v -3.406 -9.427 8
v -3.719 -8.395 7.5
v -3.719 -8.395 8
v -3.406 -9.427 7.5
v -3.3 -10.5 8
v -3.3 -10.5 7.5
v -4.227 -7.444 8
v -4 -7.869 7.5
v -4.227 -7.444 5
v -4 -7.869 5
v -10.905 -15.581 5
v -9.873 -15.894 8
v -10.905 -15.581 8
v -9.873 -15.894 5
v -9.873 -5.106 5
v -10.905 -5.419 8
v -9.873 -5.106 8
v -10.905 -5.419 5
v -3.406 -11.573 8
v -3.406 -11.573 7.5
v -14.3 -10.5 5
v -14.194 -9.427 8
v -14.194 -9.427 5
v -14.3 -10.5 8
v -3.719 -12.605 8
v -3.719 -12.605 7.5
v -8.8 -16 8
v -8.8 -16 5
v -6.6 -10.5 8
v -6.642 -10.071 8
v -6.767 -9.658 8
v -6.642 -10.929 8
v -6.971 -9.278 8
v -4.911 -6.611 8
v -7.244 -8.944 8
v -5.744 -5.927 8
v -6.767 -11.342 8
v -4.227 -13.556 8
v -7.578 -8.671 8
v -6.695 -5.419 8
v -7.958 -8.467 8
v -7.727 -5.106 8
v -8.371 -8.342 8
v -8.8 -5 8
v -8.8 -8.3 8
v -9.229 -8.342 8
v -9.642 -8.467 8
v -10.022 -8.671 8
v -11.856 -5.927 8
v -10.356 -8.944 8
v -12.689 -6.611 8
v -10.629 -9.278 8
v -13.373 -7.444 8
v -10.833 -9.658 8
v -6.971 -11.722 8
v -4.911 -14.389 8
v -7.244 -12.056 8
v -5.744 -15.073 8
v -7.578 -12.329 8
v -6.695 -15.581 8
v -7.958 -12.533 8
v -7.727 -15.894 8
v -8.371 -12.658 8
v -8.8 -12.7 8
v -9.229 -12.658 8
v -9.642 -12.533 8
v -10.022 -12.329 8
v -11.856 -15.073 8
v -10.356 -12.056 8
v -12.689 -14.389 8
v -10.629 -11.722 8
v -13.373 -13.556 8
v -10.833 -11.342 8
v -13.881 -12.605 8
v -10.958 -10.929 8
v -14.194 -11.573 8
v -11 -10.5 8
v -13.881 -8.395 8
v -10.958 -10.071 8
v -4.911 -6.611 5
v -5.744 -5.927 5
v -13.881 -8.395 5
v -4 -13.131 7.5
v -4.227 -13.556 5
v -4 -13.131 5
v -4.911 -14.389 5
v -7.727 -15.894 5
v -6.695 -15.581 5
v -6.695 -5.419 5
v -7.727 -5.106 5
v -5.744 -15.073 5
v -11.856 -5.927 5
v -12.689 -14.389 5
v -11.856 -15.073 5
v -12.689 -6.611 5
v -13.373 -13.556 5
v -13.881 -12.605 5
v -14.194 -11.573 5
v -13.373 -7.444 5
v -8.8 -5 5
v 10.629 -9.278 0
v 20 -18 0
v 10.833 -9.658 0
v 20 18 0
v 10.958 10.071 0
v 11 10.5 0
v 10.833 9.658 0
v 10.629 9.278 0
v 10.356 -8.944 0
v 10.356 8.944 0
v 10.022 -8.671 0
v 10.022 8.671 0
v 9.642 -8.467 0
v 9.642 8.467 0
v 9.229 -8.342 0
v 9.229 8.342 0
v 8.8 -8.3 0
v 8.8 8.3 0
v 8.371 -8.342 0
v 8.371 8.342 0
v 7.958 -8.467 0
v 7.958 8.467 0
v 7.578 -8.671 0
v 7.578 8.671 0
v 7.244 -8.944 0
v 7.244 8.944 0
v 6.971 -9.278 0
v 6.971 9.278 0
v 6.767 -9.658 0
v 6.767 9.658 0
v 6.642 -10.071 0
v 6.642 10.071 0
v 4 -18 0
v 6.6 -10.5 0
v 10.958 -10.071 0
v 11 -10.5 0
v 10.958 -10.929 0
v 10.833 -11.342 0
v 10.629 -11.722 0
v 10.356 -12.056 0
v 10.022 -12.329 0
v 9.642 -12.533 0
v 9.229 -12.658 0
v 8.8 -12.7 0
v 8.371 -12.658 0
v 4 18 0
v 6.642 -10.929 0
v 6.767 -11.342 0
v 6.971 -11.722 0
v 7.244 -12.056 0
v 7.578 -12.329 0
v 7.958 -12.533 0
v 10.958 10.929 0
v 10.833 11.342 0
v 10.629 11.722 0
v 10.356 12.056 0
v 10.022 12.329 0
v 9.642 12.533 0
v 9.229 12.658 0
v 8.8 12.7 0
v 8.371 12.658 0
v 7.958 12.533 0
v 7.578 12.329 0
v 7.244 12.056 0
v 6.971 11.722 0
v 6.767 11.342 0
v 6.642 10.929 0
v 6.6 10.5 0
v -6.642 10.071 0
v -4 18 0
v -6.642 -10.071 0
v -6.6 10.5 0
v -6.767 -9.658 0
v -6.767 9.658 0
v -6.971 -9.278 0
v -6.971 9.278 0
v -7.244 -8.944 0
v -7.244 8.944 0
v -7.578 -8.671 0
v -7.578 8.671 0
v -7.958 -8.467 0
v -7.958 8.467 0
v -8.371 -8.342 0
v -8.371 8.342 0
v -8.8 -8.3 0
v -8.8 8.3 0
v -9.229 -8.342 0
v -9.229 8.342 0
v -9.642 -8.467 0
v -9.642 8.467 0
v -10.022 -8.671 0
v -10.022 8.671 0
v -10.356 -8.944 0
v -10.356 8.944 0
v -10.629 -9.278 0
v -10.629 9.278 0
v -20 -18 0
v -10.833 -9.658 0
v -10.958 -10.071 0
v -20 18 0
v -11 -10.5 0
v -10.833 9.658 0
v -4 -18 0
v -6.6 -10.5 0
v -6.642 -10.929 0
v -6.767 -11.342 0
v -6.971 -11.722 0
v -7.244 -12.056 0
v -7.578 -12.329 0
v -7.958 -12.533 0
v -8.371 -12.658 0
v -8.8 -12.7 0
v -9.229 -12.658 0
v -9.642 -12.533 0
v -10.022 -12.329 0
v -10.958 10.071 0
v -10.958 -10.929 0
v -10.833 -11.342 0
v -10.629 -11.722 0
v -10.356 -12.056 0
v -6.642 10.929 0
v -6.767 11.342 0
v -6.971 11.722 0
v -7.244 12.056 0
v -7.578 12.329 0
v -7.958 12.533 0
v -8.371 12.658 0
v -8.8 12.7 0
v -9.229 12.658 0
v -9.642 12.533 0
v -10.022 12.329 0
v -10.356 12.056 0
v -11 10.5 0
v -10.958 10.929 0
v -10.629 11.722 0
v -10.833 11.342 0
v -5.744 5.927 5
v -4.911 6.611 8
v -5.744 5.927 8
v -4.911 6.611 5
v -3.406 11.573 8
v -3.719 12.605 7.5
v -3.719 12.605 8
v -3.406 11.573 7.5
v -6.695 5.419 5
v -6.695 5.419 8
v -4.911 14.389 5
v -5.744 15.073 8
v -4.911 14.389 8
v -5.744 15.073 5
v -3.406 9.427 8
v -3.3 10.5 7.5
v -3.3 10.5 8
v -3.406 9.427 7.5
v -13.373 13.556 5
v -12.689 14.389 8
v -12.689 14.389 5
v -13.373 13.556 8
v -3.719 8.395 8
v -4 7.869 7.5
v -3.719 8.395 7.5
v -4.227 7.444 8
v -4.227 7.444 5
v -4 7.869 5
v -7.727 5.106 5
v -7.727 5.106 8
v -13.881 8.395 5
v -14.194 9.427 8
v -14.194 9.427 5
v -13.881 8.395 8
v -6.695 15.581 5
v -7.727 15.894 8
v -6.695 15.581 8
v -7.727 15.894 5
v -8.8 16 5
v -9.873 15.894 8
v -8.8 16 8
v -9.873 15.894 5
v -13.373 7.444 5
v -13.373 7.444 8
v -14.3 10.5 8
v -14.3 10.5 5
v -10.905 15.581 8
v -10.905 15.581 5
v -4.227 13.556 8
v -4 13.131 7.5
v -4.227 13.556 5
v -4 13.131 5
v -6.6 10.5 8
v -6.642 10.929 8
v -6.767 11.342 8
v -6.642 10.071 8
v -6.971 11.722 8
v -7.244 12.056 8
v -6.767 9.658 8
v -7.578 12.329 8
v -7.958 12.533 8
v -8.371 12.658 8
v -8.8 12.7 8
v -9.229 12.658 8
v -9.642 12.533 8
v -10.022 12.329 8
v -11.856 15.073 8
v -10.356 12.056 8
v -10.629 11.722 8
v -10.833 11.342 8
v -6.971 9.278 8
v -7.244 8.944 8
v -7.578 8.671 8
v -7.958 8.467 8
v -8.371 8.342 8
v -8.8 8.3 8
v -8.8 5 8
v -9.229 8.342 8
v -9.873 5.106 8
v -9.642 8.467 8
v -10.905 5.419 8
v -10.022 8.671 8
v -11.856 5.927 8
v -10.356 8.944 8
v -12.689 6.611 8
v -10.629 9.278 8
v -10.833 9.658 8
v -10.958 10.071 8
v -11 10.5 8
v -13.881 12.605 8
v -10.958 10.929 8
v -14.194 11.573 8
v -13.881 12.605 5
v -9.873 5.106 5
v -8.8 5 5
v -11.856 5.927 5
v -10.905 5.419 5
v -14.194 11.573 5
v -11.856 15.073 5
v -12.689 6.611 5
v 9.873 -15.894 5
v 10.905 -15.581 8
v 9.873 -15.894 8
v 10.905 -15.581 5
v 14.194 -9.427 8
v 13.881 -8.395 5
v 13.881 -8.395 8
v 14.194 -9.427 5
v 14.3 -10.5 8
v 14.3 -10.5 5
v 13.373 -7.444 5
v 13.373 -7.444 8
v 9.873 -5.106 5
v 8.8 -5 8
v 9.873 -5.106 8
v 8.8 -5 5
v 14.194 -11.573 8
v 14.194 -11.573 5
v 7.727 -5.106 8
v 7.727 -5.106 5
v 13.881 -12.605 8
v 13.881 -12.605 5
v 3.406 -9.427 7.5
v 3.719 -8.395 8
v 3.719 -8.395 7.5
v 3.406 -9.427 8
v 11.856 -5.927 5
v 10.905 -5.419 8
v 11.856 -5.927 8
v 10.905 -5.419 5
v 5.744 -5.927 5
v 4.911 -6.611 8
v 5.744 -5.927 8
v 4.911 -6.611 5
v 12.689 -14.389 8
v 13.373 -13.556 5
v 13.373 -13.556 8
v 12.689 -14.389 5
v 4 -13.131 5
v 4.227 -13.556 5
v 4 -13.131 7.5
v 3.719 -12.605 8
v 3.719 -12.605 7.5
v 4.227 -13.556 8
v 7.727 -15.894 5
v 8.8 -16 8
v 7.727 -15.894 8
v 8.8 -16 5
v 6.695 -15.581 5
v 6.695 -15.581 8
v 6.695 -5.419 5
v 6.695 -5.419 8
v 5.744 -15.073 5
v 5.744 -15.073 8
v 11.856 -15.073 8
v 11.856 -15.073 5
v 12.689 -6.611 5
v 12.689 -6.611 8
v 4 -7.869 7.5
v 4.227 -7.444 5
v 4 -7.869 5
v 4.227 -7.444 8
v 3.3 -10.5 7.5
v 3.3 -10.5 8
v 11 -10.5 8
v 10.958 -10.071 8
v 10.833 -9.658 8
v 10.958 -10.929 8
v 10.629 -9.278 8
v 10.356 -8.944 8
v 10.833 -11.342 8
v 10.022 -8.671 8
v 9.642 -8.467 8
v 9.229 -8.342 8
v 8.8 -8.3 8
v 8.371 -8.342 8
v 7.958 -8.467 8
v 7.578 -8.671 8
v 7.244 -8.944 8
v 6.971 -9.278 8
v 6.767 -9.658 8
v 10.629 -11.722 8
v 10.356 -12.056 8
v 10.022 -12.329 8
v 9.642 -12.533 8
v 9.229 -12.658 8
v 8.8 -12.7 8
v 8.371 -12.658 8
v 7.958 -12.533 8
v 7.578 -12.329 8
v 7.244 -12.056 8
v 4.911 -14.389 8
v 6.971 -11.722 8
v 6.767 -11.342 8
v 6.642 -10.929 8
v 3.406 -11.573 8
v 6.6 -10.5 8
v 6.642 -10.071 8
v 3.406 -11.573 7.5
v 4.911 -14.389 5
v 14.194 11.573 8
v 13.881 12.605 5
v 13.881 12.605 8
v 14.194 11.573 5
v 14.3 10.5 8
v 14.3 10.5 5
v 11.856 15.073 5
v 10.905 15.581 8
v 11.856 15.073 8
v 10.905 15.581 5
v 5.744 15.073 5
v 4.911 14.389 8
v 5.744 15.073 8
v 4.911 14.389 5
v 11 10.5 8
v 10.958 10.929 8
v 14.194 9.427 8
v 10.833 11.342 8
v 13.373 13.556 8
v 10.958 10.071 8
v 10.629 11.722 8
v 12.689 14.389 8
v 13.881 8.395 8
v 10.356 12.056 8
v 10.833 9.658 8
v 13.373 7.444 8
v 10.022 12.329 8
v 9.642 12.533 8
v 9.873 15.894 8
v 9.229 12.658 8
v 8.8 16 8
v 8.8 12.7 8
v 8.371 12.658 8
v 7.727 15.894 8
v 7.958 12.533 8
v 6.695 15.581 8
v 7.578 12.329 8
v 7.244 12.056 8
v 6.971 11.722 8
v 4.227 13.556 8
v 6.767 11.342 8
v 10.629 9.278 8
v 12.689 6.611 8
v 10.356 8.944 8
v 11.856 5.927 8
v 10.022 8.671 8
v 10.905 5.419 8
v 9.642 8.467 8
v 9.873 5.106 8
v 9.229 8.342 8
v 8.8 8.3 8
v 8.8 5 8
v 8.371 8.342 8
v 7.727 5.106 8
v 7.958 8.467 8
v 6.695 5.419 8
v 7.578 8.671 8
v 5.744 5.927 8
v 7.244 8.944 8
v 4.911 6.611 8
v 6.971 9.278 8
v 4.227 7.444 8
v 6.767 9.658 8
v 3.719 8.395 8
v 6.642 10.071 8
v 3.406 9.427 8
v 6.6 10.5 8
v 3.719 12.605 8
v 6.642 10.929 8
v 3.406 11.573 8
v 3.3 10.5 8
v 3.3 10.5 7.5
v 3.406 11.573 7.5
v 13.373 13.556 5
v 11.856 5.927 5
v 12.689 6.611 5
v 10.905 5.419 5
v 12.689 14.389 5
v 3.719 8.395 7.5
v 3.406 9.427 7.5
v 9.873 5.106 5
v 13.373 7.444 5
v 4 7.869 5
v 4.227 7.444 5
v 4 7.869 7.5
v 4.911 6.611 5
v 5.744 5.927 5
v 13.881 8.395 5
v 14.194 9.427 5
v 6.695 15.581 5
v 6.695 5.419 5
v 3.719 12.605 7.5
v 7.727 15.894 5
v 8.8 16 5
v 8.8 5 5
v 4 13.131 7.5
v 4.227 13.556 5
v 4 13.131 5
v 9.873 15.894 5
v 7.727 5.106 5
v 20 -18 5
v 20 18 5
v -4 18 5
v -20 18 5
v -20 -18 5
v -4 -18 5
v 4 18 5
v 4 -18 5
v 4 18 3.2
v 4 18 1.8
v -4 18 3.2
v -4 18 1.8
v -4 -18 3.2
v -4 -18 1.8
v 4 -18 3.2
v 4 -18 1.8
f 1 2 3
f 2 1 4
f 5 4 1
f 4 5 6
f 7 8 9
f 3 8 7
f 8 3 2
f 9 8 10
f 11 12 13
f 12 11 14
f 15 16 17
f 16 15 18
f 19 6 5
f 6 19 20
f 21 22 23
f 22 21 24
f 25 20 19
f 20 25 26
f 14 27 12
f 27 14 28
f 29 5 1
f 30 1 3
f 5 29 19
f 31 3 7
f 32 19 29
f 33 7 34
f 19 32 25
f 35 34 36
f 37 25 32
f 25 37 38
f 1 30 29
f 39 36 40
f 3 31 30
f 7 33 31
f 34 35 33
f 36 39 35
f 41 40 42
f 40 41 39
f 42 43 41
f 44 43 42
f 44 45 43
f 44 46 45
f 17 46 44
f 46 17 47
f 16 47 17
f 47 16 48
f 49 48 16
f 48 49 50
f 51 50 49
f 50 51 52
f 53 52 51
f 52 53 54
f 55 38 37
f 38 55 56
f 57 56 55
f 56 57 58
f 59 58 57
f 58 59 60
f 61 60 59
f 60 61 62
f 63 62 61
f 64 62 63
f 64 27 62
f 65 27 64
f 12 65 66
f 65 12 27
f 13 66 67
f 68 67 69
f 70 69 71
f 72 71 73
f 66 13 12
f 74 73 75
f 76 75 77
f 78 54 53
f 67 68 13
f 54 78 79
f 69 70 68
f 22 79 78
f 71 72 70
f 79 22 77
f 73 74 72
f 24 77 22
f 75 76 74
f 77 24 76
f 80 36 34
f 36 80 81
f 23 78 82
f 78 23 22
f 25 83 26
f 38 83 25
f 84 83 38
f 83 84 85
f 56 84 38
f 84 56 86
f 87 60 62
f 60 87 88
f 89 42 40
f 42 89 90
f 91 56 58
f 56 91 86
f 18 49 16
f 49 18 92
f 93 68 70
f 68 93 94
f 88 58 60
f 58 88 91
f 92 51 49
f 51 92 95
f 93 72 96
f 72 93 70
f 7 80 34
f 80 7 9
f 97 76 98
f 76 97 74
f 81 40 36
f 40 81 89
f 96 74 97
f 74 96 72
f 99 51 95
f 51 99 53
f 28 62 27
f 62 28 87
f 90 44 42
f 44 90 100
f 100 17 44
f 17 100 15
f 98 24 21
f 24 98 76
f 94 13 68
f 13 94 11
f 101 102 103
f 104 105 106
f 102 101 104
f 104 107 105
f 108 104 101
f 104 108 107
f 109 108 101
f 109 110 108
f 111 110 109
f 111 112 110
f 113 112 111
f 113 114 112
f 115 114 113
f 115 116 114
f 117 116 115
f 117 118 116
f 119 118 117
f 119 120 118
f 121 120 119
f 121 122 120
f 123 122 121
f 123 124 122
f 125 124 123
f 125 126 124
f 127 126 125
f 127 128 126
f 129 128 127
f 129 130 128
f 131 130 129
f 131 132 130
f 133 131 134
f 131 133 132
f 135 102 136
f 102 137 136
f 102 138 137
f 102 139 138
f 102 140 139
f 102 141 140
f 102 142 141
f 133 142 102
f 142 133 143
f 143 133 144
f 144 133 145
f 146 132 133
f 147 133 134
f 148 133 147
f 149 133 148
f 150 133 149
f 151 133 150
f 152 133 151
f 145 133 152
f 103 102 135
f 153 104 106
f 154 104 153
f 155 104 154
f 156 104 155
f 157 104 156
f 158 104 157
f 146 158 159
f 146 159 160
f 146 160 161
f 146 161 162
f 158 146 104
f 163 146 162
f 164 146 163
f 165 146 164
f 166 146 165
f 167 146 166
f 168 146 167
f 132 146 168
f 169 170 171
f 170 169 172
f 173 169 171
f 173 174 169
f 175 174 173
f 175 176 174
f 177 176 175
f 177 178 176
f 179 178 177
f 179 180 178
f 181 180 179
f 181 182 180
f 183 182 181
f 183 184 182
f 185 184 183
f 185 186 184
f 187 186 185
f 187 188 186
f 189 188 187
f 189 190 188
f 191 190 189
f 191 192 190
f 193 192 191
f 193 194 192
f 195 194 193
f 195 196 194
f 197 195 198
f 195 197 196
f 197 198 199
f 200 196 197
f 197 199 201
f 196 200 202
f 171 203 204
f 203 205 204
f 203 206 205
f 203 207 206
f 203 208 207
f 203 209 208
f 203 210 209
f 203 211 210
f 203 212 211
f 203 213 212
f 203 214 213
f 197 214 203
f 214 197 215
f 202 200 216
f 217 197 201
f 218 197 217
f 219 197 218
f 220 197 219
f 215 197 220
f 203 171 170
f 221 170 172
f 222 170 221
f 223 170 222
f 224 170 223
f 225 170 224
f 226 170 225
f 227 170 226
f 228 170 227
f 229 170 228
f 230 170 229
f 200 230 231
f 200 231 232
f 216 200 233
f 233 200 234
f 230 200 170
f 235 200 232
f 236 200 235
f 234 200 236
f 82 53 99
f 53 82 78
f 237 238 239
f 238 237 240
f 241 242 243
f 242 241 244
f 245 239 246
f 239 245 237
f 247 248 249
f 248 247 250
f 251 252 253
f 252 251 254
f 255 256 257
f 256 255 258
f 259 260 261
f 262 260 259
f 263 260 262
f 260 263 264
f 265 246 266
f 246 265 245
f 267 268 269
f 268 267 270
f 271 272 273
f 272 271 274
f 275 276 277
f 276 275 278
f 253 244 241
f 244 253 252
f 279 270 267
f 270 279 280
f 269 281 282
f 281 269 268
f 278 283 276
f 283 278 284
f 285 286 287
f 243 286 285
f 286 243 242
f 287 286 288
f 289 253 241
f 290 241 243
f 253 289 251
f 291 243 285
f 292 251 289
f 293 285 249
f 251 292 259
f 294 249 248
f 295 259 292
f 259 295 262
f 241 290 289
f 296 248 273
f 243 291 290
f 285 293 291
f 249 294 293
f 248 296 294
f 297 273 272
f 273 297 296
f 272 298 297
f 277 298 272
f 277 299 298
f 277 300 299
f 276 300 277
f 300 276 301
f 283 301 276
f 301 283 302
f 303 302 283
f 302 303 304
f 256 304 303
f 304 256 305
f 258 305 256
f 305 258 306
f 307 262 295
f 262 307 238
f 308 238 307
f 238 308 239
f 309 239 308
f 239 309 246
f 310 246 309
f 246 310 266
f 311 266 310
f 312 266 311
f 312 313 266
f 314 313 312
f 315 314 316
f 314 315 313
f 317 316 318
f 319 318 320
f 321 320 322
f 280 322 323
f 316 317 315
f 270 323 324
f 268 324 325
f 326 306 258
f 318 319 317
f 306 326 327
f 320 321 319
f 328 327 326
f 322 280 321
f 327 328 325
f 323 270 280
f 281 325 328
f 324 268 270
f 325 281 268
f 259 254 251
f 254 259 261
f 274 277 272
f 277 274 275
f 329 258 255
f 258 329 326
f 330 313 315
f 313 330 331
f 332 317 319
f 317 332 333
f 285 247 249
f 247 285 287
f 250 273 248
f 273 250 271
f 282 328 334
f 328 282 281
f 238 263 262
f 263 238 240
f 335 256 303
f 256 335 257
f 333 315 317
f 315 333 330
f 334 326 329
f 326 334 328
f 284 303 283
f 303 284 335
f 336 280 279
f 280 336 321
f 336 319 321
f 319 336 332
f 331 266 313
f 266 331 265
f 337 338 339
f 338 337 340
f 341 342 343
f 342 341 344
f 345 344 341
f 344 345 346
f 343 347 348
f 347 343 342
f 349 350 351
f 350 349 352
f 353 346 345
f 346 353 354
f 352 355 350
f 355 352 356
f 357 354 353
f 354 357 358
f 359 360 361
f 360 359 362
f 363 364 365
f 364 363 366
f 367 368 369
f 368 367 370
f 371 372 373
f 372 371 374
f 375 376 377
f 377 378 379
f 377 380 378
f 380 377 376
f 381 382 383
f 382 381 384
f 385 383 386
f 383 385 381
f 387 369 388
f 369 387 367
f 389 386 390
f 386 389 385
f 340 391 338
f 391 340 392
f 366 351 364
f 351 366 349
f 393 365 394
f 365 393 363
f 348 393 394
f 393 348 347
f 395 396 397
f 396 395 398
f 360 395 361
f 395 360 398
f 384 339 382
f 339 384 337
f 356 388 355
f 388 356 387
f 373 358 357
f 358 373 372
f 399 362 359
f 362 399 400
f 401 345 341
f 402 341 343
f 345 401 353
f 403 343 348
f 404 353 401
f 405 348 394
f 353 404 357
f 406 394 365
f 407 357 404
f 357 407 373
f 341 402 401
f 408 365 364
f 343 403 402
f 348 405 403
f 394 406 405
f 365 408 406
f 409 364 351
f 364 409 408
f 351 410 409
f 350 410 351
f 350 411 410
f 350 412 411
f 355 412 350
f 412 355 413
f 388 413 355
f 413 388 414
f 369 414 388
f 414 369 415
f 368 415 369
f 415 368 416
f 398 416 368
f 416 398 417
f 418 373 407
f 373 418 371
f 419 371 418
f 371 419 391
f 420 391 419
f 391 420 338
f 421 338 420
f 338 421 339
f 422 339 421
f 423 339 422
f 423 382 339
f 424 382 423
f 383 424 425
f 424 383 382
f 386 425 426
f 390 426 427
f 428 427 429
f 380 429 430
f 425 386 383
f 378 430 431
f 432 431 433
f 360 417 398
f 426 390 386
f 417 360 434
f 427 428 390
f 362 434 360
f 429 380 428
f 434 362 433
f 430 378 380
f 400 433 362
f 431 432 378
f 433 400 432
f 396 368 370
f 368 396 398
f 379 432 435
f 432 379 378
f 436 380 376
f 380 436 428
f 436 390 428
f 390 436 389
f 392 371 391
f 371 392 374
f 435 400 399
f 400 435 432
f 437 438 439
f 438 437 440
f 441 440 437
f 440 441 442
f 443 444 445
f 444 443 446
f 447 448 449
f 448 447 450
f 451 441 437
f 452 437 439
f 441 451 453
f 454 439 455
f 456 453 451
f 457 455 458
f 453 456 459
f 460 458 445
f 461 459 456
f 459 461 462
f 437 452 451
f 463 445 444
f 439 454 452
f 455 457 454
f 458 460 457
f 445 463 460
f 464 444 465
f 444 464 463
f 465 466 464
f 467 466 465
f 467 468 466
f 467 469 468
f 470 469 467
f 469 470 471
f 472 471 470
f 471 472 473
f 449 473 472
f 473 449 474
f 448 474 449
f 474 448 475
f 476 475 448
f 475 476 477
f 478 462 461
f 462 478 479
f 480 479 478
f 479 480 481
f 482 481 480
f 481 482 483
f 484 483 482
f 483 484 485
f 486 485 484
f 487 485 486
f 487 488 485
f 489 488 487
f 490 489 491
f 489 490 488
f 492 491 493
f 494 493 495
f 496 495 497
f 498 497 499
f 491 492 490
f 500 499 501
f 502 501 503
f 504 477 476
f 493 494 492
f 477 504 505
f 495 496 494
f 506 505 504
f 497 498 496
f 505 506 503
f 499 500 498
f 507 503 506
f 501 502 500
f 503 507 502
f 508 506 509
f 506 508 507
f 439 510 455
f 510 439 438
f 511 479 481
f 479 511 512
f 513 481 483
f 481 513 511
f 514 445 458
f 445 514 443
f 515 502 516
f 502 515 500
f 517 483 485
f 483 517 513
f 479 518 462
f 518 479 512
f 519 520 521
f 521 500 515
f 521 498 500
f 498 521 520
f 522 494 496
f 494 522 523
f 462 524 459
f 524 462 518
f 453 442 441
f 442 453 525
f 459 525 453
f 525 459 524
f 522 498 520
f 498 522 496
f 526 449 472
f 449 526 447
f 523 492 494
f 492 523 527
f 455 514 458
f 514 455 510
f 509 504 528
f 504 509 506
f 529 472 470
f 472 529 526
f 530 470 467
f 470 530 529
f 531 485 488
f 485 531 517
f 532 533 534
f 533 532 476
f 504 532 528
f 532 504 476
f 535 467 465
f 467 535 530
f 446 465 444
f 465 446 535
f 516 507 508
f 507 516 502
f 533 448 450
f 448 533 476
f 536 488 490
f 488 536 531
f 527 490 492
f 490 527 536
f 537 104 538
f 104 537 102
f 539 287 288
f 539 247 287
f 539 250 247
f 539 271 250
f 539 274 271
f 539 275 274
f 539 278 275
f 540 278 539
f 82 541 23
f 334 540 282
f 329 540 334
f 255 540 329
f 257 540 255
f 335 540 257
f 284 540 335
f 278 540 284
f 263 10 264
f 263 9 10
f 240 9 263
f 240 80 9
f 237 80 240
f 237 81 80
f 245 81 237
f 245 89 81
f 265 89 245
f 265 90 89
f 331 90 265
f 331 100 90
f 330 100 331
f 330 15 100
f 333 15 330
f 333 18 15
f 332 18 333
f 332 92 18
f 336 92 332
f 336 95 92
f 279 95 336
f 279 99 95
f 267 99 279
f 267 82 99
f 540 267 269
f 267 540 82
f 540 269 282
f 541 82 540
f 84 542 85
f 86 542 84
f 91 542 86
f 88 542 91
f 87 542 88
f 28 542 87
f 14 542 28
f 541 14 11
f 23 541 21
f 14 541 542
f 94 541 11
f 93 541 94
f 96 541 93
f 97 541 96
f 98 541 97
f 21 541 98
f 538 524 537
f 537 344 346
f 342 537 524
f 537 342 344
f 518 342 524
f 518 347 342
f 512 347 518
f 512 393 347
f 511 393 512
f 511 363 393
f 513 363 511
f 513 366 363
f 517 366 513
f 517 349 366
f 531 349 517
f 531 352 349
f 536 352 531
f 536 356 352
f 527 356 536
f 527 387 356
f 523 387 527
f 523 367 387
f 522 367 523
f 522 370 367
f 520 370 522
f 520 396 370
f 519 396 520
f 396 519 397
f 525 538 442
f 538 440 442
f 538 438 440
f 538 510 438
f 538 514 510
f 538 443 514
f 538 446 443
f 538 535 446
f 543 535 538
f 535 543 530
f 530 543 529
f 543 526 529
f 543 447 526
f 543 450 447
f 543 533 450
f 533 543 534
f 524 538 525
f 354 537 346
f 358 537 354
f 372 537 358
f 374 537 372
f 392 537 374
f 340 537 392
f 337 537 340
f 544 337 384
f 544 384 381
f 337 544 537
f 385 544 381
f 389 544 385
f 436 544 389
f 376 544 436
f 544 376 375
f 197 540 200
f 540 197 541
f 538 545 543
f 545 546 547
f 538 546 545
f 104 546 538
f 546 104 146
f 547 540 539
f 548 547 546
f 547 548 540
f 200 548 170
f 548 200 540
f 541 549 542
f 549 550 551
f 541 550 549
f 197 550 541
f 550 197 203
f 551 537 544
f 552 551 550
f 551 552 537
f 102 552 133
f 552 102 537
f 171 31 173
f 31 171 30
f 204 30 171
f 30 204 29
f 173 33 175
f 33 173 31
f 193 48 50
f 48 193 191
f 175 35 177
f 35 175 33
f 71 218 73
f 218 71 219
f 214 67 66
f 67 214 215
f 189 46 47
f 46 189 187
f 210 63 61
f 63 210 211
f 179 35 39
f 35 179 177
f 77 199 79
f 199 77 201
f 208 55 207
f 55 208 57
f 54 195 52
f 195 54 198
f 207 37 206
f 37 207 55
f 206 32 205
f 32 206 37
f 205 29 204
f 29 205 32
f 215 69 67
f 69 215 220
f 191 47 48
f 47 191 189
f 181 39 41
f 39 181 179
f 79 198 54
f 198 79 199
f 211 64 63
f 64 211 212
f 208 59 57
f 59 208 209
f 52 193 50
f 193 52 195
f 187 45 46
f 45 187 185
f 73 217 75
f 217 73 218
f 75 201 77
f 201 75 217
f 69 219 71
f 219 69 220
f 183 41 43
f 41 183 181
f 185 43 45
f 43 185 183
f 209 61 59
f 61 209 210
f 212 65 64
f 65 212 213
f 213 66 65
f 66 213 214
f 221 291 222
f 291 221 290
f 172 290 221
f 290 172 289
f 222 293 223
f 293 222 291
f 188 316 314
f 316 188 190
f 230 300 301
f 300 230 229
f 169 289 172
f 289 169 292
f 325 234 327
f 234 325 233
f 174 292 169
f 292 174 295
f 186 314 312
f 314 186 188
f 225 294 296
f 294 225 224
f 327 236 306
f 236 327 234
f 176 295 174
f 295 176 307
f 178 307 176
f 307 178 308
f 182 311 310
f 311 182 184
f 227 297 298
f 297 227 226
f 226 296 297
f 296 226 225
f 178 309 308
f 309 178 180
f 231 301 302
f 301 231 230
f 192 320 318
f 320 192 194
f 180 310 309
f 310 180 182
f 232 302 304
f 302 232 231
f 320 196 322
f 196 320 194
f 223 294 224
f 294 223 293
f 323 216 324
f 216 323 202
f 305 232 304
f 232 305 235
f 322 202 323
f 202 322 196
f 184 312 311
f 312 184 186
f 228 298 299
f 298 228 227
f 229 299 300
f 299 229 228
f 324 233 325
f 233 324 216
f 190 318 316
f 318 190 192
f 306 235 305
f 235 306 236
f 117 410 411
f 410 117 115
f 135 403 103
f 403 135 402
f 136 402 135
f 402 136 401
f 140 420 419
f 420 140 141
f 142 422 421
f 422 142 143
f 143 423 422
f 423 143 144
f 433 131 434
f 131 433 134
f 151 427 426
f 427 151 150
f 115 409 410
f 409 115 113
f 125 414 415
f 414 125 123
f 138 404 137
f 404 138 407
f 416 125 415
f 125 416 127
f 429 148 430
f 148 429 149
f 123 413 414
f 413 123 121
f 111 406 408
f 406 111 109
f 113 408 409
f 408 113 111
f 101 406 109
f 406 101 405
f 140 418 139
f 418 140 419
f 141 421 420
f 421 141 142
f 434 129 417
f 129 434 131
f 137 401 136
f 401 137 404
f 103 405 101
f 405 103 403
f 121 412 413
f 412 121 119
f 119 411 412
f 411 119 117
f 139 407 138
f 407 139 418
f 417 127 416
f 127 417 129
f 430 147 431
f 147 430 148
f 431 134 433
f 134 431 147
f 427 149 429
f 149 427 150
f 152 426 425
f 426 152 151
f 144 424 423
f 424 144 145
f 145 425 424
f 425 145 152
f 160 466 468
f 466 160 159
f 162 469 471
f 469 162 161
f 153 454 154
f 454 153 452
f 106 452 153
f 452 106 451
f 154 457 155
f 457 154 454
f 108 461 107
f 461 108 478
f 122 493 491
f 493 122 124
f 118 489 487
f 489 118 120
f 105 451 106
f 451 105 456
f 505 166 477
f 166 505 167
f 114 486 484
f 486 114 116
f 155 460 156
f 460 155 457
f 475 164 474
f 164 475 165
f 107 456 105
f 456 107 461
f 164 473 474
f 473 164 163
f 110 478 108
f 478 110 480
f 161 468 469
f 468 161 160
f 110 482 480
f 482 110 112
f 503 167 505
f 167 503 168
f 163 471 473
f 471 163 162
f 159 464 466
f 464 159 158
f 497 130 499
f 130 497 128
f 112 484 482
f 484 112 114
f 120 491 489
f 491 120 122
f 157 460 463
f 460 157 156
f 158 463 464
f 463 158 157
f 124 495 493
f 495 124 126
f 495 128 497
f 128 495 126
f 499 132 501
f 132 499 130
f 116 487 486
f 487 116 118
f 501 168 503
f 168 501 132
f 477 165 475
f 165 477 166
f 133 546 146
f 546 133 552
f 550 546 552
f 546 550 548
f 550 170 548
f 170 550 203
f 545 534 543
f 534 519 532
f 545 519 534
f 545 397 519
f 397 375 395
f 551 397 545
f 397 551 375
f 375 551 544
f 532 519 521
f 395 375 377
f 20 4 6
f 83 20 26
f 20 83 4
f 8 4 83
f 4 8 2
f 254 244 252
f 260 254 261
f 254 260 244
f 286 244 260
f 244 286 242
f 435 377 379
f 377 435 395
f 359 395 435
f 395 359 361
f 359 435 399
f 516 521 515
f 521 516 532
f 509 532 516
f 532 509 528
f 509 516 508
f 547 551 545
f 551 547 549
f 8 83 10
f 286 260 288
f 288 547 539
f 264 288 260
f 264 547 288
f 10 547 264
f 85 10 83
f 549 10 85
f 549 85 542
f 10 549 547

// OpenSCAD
$fn = 32;

// ----------------------------------------------------------------------
// Living hinge: 40 x 36 mm plates, 1.4 mm flexible web
// ----------------------------------------------------------------------

// --- parameters (mm) ---
plate_len = 16;           // plate length outside the web
plate_w = 36;             // plate width
thick = 5;                // plate thickness
web_half = 4;             // half width of the flex band
web_t = 1.4;              // flexible web thickness
web_z = 1.8;              // web position inside the thickness
boss_d = 11;              // screw boss diameter
boss_h = 8;               // screw boss height
boss_x = 8.8;             // screw boss distance from the web
screw_d = 4.4;            // screw hole

difference() {
  union() {
    /* one flat strip, later thinned at the middle */
    translate([-20, -18, 0]) cube([40, 36, 5]);
    /* screw bosses, sunk 0.5 mm into the plates */
    for (sx = [-8.8, 8.8]) {
      for (sy = [-10.5, 10.5]) {
        translate([sx, sy, 0]) cylinder(h = boss_h, d = boss_d);
      }
    }
  }
  /* channel from below: leaves the web on top of it */
  translate([-4, -20.5, -2.5]) cube([8, 41, 4.3]);
  /* channel from above: thins the web down to web_t */
  translate([-4, -20.5, 3.2]) cube([8, 41, 4.3]);
  /* screw holes through the bosses */
  for (sx = [-8.8, 8.8]) {
    for (sy = [-10.5, 10.5]) {
      translate([sx, sy, -2.5]) cylinder(h = boss_h + 5, d = screw_d);
    }
  }
}
